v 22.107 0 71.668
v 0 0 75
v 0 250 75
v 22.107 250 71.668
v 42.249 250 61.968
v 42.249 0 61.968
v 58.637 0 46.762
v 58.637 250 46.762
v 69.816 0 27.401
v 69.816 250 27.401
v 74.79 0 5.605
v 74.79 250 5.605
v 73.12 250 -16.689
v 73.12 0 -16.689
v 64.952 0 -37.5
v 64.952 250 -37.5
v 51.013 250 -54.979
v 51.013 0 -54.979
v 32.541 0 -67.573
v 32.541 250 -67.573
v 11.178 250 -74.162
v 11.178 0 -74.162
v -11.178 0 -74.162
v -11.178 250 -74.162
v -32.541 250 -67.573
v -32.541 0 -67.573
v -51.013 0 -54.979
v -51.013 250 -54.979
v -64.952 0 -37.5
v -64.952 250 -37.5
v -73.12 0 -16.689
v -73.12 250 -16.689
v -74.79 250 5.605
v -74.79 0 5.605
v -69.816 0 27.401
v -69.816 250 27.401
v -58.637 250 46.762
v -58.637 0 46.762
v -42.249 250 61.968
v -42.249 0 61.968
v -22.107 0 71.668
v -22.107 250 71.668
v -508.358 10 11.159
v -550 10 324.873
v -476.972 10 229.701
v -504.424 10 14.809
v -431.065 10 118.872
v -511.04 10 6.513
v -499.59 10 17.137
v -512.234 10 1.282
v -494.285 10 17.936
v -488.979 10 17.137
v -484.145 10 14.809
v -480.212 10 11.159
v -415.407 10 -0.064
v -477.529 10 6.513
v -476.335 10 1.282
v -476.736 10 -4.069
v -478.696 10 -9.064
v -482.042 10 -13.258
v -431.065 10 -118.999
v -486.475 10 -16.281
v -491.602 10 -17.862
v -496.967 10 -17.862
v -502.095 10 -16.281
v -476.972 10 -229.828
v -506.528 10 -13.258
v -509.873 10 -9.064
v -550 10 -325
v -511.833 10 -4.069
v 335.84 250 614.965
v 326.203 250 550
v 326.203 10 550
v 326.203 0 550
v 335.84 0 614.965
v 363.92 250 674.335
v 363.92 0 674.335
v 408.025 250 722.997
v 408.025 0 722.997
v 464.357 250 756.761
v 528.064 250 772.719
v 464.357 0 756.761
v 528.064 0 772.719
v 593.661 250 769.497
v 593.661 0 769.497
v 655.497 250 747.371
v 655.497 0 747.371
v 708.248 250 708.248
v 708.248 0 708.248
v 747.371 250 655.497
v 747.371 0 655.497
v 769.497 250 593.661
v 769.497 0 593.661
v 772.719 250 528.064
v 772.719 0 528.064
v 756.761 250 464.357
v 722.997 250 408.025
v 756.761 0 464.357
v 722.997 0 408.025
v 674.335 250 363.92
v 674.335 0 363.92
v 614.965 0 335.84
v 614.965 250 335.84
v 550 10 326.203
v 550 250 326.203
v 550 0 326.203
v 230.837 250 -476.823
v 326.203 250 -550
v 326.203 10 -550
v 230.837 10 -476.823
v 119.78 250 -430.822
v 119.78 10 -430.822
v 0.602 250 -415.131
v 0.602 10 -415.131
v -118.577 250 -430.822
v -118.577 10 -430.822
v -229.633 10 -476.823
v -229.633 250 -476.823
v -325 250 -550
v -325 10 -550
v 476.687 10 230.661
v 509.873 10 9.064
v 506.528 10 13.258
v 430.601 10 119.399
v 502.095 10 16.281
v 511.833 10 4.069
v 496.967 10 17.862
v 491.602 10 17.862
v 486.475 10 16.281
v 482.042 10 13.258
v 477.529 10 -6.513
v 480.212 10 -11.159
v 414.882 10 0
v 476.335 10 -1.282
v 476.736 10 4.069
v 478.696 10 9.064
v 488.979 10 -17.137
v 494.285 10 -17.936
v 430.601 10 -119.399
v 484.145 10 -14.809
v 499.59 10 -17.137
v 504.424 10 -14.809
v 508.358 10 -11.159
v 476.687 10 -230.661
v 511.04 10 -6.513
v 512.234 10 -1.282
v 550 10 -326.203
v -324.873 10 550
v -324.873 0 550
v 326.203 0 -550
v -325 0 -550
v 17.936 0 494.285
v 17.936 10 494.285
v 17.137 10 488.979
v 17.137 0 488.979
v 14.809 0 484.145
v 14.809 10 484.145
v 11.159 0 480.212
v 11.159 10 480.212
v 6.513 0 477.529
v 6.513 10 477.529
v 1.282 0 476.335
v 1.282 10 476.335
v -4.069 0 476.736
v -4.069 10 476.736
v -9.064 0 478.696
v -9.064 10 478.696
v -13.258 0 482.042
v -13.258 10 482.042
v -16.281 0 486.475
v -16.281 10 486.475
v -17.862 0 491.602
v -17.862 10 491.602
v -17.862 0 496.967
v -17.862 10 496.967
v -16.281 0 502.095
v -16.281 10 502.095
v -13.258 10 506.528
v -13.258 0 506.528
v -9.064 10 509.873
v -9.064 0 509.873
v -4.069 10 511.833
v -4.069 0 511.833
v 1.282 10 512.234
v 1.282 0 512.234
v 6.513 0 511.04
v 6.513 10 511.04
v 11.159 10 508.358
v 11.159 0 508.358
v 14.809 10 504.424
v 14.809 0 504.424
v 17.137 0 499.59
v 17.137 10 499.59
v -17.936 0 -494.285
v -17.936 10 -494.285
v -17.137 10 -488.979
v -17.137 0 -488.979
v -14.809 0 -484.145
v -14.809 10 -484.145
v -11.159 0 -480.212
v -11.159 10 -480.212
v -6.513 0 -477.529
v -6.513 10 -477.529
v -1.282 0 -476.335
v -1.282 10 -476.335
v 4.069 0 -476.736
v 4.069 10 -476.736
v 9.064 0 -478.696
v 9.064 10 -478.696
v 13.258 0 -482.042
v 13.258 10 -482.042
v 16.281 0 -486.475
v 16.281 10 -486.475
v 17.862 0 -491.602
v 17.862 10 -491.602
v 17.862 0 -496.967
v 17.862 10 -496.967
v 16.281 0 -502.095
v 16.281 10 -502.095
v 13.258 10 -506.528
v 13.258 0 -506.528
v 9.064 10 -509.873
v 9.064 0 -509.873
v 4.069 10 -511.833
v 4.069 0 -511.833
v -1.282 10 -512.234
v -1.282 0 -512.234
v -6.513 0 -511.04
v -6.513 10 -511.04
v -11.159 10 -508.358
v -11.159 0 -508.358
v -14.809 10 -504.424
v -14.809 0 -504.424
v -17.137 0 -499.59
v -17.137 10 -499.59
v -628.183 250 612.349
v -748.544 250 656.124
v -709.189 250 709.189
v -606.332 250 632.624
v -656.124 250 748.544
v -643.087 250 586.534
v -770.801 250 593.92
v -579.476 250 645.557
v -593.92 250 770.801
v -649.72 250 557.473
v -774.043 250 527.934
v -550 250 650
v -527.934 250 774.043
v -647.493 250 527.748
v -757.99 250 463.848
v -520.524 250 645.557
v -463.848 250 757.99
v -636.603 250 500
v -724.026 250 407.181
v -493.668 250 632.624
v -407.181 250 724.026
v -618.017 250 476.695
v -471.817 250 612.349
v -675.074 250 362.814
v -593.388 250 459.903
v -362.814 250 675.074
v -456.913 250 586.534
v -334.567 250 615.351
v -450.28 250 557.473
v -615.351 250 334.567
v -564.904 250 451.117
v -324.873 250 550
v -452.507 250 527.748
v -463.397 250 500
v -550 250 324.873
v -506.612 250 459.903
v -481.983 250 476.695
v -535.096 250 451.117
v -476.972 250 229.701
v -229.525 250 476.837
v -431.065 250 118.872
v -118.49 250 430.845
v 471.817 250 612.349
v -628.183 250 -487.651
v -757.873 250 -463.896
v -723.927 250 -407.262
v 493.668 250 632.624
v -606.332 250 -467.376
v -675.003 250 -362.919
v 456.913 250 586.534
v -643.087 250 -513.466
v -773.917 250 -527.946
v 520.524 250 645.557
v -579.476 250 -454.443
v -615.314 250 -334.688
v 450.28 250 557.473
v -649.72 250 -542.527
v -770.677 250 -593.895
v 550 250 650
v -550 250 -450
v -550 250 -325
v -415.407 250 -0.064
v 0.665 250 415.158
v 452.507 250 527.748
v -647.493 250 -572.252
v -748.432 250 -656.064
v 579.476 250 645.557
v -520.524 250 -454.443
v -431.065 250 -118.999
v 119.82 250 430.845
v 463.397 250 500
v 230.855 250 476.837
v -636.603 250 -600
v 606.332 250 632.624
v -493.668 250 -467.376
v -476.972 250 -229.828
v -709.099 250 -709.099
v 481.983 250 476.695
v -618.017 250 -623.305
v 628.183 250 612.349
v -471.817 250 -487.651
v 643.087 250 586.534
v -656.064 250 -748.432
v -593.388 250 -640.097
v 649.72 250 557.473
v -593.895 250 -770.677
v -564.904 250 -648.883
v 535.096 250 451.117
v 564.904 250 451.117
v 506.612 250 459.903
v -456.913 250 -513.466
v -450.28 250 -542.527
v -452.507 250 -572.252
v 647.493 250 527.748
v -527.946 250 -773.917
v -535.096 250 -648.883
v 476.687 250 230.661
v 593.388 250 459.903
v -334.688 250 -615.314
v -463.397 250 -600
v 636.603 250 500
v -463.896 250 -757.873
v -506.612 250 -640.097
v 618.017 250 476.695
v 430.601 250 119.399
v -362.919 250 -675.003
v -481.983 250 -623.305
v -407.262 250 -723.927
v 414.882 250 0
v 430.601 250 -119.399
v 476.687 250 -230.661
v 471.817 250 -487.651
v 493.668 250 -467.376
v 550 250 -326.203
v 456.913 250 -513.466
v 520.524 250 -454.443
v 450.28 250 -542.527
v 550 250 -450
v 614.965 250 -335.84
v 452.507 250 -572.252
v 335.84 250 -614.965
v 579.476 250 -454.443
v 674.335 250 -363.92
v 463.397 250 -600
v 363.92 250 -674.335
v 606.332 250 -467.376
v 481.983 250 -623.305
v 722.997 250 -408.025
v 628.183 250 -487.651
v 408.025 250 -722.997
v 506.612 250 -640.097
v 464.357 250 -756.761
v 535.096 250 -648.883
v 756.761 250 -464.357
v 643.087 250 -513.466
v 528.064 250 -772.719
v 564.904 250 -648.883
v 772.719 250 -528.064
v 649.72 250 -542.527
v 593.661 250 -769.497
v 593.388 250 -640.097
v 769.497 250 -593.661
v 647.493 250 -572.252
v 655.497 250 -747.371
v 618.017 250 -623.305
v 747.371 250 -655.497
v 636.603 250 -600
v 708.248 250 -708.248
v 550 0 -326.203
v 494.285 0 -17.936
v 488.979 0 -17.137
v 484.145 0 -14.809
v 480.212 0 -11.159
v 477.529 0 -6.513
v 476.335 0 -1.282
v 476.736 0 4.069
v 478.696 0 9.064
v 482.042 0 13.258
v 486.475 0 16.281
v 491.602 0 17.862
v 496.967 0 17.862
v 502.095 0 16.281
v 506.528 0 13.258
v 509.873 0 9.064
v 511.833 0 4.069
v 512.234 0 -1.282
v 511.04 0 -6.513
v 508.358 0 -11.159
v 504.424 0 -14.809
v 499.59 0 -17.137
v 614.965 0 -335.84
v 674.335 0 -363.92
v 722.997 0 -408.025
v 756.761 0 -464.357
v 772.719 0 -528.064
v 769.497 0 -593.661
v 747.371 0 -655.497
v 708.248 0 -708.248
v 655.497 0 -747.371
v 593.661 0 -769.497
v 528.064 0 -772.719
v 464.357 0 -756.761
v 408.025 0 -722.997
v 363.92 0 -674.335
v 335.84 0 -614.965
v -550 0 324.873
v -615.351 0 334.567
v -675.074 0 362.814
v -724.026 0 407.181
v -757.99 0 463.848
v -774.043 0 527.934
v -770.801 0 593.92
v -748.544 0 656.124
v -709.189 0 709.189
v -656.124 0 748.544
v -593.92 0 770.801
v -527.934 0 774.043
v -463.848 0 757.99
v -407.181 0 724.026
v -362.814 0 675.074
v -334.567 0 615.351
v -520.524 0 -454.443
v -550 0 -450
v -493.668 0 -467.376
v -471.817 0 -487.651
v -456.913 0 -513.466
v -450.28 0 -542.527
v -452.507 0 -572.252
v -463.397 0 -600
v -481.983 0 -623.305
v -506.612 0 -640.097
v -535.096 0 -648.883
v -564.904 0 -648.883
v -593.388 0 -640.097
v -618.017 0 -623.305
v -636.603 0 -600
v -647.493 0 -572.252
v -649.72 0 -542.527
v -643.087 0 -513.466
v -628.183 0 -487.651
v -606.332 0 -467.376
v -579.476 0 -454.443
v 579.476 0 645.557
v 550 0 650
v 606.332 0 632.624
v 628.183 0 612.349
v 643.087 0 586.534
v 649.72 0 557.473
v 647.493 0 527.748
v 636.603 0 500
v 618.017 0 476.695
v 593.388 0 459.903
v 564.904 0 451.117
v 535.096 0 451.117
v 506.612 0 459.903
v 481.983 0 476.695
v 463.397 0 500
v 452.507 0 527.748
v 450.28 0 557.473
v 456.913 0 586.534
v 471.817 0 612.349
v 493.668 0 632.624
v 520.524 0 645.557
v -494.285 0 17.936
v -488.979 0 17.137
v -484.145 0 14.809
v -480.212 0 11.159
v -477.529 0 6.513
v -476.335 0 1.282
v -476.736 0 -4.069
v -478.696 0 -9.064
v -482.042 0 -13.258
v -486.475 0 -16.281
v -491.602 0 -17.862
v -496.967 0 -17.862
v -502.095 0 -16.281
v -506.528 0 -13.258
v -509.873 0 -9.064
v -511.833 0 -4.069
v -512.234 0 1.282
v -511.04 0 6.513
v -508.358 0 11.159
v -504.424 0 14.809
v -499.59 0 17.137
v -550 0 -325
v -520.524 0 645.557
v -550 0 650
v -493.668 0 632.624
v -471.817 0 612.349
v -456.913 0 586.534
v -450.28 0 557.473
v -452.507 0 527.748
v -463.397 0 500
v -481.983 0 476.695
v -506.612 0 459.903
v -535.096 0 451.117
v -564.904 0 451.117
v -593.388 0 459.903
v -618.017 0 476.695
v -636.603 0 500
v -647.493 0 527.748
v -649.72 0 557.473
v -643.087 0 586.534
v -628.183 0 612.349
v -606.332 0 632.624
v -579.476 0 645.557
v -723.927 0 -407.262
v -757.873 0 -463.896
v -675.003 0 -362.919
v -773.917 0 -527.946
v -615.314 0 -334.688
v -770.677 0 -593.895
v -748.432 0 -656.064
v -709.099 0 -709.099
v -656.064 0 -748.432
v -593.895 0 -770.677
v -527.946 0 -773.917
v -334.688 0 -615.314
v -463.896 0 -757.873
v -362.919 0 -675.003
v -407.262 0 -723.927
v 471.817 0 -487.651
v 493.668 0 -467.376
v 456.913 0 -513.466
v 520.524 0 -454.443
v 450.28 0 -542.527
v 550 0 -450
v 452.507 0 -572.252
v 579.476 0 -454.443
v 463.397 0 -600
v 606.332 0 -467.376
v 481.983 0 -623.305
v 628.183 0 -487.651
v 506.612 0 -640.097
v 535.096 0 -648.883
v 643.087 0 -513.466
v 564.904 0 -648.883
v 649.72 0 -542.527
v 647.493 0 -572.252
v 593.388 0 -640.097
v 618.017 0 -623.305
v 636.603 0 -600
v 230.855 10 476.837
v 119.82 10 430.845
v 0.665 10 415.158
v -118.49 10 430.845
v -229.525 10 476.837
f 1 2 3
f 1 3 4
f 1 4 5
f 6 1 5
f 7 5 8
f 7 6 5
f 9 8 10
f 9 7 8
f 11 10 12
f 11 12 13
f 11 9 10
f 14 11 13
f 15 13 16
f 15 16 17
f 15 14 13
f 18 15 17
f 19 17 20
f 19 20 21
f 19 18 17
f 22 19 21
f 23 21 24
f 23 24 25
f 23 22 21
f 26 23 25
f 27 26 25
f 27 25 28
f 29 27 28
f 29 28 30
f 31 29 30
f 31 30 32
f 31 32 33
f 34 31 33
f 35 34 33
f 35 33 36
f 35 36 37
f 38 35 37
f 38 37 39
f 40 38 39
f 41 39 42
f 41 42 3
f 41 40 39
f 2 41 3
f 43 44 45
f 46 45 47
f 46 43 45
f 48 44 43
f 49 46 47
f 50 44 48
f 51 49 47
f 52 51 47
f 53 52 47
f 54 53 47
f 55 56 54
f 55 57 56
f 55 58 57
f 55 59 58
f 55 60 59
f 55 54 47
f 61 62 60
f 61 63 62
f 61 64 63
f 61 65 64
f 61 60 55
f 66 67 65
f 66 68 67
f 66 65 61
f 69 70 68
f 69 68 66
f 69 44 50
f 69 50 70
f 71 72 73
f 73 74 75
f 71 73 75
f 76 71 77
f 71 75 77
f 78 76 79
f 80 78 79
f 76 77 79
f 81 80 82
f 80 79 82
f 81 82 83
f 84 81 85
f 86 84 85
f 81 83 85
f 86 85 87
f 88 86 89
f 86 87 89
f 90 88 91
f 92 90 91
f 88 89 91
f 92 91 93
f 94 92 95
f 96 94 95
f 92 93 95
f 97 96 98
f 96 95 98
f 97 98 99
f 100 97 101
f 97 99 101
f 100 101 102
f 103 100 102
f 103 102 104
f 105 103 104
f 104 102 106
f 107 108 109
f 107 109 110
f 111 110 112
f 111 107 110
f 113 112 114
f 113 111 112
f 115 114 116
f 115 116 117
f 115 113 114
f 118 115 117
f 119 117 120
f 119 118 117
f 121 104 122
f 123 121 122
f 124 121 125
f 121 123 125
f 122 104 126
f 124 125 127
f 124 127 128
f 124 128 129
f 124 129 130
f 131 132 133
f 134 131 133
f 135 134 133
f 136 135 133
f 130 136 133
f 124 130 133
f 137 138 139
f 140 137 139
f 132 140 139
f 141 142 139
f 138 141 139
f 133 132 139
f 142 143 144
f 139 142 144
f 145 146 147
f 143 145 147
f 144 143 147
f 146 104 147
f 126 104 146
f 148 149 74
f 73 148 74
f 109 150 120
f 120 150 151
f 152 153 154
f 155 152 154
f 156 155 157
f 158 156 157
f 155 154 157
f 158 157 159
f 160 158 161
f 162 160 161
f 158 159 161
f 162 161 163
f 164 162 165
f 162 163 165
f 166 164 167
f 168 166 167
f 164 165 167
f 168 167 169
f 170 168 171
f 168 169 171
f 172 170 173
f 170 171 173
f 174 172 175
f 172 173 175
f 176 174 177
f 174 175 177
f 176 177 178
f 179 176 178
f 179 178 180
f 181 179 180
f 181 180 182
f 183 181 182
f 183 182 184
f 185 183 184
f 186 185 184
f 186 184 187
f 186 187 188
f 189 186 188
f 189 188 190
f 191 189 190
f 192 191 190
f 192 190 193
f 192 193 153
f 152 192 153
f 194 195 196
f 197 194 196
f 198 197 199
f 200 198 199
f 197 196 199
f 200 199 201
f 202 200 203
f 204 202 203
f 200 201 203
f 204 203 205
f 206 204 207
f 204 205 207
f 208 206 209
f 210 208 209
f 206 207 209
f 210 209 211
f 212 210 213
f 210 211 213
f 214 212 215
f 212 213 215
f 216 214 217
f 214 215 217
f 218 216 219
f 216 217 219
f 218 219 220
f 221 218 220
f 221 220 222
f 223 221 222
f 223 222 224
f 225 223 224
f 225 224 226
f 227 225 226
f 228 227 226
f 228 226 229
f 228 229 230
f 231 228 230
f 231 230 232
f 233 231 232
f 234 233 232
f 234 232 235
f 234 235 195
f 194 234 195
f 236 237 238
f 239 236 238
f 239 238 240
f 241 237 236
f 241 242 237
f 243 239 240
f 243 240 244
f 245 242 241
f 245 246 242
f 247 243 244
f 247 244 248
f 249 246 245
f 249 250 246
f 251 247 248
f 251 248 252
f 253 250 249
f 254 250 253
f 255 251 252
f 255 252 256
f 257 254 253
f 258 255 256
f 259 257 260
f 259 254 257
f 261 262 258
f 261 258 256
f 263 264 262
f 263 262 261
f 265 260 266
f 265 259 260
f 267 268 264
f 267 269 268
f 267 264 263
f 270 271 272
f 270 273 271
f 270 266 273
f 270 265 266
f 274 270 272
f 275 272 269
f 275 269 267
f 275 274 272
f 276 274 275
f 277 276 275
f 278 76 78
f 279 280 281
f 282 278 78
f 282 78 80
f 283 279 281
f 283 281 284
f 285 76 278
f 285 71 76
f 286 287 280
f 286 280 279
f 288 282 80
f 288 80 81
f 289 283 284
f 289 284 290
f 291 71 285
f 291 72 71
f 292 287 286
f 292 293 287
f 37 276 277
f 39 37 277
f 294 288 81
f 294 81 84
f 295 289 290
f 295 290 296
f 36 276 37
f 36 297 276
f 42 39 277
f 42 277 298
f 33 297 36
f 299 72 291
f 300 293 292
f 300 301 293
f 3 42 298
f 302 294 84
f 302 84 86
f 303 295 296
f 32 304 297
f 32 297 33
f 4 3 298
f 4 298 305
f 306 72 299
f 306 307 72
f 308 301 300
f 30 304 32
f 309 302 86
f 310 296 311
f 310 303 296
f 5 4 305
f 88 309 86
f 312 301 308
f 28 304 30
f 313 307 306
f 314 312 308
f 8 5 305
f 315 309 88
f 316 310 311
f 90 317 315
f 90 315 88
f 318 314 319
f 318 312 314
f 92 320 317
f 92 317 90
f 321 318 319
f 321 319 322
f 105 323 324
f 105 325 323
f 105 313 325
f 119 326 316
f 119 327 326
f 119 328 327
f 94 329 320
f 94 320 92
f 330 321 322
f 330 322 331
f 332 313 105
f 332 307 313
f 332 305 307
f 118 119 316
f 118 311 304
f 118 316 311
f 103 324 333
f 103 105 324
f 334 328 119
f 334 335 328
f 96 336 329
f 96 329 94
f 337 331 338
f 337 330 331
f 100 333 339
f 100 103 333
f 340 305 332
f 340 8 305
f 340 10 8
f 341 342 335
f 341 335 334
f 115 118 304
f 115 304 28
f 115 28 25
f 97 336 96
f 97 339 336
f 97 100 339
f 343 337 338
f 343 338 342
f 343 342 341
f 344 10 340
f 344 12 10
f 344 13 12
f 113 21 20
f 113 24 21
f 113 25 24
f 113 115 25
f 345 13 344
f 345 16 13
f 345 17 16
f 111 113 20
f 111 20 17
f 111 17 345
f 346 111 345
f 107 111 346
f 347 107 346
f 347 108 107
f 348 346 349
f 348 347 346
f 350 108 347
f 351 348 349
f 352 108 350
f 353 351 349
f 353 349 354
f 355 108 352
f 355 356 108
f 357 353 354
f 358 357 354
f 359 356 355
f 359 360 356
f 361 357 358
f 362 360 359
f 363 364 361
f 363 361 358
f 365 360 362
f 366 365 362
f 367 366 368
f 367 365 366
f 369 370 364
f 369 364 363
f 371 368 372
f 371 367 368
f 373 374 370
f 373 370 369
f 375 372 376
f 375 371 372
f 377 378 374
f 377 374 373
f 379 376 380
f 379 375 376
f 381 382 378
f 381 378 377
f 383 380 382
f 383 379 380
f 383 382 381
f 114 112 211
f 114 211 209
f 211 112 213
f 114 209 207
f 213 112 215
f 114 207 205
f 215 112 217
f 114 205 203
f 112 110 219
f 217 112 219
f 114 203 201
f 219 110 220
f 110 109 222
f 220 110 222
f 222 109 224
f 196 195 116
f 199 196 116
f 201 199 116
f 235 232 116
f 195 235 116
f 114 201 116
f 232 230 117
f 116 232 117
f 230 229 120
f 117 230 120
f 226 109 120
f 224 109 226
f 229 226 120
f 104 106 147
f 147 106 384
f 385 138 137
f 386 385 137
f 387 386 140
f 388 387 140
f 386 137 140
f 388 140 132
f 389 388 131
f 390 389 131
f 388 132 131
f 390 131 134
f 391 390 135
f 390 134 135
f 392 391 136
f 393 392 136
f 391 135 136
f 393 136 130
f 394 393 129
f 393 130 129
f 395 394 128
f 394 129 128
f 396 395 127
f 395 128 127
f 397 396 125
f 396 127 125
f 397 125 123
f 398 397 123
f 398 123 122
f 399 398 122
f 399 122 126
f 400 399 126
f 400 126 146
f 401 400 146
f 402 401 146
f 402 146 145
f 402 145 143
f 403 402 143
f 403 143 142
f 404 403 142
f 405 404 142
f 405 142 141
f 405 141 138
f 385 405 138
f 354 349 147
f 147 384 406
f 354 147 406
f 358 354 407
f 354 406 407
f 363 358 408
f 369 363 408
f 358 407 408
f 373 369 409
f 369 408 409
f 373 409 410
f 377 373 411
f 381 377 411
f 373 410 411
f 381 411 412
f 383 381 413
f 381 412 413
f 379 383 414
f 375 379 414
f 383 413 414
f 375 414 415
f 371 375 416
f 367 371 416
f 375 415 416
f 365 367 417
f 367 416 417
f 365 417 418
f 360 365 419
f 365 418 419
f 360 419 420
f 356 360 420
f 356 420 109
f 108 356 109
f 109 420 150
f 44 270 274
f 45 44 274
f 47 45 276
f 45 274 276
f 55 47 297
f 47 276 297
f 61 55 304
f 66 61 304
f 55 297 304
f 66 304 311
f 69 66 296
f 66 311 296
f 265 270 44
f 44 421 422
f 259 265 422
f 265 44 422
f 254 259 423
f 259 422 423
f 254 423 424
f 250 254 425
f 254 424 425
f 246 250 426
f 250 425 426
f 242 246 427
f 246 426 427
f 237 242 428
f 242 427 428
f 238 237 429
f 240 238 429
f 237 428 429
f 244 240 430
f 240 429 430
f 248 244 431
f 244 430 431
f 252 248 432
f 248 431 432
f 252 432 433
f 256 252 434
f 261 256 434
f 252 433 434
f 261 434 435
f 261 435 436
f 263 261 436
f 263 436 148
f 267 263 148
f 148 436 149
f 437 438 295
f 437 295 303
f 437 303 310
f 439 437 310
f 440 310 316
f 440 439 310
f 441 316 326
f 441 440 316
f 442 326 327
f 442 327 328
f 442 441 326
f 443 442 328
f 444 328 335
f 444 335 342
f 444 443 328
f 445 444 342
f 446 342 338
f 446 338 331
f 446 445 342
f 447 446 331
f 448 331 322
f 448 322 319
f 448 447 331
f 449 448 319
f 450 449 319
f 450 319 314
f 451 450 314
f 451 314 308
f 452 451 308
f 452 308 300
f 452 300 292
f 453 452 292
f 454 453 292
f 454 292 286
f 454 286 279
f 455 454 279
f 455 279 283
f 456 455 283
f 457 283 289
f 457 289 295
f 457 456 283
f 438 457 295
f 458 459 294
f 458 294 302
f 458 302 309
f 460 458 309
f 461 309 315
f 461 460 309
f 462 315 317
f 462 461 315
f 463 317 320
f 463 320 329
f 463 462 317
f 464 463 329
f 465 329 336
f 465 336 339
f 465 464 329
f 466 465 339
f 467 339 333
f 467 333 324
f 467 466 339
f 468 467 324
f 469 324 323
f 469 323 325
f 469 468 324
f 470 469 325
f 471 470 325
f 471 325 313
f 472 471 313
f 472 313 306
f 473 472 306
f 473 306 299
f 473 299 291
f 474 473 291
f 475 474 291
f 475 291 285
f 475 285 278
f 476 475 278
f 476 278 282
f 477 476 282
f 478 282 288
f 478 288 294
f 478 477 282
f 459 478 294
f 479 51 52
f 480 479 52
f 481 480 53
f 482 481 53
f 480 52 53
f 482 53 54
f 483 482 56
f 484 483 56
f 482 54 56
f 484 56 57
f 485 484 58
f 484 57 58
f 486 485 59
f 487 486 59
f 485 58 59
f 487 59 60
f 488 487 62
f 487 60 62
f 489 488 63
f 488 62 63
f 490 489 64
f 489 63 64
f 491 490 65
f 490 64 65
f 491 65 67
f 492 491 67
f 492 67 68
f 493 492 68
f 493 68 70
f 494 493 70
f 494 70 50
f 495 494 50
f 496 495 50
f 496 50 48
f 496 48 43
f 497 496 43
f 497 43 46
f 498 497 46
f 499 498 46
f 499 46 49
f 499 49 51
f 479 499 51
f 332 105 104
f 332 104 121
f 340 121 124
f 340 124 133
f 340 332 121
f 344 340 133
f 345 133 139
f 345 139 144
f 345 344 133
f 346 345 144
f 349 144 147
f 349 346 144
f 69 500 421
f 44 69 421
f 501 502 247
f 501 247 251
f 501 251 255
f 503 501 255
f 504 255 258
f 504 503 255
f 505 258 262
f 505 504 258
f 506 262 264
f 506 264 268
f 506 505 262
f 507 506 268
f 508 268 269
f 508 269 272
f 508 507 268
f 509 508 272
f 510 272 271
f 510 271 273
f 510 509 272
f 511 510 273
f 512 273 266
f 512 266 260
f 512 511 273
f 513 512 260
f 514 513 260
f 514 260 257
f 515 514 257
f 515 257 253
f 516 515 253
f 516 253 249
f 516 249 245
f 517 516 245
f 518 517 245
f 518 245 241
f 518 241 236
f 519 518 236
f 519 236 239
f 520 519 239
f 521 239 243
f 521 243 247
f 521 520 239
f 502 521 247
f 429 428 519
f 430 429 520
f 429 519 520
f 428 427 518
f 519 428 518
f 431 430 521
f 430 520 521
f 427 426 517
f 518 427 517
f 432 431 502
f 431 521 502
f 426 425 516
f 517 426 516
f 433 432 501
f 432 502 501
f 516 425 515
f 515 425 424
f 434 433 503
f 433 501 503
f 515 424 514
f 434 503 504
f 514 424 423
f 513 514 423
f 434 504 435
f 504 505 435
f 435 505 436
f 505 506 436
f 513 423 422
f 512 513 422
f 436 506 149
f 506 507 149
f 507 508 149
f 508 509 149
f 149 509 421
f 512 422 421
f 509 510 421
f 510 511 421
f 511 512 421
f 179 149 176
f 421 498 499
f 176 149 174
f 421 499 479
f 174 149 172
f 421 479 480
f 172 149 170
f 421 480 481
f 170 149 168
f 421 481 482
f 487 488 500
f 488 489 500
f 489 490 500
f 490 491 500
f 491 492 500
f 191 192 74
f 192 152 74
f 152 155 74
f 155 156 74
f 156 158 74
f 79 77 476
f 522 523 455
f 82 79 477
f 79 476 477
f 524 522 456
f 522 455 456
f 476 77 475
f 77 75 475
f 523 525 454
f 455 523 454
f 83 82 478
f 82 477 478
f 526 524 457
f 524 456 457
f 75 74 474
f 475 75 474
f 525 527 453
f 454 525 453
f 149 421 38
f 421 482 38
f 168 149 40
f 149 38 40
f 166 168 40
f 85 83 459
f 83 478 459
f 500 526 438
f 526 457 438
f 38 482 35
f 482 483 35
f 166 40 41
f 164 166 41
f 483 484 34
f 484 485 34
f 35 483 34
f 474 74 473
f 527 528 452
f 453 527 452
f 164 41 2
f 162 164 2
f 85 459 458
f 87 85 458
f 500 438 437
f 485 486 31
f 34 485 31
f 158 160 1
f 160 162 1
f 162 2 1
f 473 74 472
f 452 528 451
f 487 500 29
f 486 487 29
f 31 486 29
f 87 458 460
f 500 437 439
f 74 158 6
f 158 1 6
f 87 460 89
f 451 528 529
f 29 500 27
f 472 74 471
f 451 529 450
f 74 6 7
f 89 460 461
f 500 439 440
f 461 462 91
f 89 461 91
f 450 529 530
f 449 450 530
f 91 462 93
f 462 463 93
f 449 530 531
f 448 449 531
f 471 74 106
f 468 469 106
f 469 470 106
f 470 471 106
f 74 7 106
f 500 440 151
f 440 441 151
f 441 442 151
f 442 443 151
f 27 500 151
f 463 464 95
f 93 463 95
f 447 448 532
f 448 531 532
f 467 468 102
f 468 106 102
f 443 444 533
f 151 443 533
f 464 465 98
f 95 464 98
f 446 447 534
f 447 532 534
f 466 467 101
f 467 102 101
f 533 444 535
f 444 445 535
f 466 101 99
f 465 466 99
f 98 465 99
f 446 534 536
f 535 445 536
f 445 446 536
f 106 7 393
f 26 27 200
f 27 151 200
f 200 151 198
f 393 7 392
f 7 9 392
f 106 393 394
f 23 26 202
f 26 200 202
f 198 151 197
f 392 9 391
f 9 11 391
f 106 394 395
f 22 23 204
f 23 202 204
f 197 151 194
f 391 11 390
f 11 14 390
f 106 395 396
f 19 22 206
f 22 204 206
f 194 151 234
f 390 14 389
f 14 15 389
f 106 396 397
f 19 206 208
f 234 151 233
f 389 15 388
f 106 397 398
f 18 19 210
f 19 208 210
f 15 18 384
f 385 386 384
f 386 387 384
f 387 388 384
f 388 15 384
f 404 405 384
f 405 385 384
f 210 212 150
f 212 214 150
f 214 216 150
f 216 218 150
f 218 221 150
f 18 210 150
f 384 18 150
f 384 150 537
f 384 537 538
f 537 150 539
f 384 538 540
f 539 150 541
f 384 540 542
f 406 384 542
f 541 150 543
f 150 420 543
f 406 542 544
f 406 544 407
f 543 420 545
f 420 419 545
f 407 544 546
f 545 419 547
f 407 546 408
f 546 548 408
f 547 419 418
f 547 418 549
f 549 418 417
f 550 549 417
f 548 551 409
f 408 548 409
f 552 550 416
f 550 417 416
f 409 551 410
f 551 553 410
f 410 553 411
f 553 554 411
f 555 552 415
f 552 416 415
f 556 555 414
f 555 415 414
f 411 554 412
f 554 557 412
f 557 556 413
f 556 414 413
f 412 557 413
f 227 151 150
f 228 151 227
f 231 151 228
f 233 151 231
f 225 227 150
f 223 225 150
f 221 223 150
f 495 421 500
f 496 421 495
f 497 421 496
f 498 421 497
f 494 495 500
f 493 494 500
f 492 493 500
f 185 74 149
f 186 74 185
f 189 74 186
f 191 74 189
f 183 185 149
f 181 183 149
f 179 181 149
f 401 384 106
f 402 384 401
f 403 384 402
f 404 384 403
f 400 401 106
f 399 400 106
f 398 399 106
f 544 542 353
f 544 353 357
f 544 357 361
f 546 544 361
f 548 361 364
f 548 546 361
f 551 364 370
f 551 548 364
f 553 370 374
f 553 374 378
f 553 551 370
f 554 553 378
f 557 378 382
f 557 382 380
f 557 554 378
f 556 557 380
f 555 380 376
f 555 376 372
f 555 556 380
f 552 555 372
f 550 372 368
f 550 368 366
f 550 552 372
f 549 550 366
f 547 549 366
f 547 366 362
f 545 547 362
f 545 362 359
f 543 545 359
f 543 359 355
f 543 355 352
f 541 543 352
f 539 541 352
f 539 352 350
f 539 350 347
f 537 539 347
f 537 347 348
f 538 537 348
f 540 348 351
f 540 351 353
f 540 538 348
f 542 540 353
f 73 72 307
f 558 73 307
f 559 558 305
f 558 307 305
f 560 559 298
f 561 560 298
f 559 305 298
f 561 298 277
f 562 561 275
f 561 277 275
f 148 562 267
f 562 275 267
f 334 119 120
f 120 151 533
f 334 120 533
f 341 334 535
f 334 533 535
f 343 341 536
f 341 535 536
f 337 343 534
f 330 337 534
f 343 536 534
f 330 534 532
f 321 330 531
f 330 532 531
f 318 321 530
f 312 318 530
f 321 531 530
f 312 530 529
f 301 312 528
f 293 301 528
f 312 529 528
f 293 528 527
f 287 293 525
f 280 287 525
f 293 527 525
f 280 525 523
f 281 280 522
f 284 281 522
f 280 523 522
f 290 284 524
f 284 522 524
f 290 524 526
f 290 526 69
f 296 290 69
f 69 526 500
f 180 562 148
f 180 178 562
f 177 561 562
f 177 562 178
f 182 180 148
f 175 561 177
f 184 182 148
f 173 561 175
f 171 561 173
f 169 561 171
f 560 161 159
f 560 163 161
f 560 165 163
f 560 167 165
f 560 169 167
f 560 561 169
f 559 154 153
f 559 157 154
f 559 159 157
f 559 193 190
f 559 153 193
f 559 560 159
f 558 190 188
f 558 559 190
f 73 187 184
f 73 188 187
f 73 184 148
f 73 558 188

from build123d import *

# Parameters (mm, degrees)
IZIM1_R                     = 75
IZIM1_R_2                   = 100
Y_KSEKLIK_EKSTR_ZYON3_DEPTH = 250
KES_EKSTR_ZYON2_DEPTH       = 240
IZIM4_R                     = 18
KES_EKSTR_ZYON3_DEPTH       = 240
DAIRESEL_KAPLAMA1_COUNT     = 4


with BuildPart() as part:
    # Çizim1 → Yükseklik-Ekstrüzyon3 (new body)
    with BuildSketch(Plane(origin=(0, 0, 0), x_dir=(1, 0, 0), z_dir=(0, 1, 0))):
        with BuildLine():
            Line((326.203305187, 550), (-325, 550))
            ThreePointArc((-325, 550), (-709.099025767, 709.099025767), (-550, 325))
            Line((-550, 325), (-550, -324.872993427))
            ThreePointArc((-550, -324.872993427), (-709.188832976, -709.188832976), (-324.872993427, -550))
            Line((-324.872993427, -550), (326.203305187, -550))
            ThreePointArc((326.203305187, -550), (708.248160509, -708.248160509), (550, -326.203305187))
            Line((550, -326.203305187), (550, 326.203305187))
            ThreePointArc((550, 326.203305187), (708.248160509, 708.248160509), (326.203305187, 550))
        make_face()
        with Locations(Location((0, 0, 0), (0, 0, 270))):
            Circle(IZIM1_R, mode=Mode.SUBTRACT)
        with Locations(Location((-550, 550, 0), (0, 0, 270))):
            Circle(IZIM1_R_2, mode=Mode.SUBTRACT)
        with Locations(Location((-550, -550, 0), (0, 0, 270))):
            Circle(IZIM1_R_2, mode=Mode.SUBTRACT)
        with Locations(Location((550, 550, 0), (0, 0, 270))):
            Circle(IZIM1_R_2, mode=Mode.SUBTRACT)
        with Locations(Location((550, -550, 0), (0, 0, 270))):
            Circle(IZIM1_R_2, mode=Mode.SUBTRACT)
    extrude(amount=Y_KSEKLIK_EKSTR_ZYON3_DEPTH)

    # Çizim2 → Kes-Ekstrüzyon2 (cut)
    with BuildSketch(Plane(origin=(0, 250, 0), x_dir=(1, 0, 0), z_dir=(0, 1, 0))):
        with BuildLine():
            Line((-550, 325), (-550, -324.872993427))
            ThreePointArc((-550, -324.872993427), (-415.406896151, 0.063503286), (-550, 325))
        make_face()
        with BuildLine():
            Line((-324.872993427, -550), (326.203305187, -550))
            ThreePointArc((326.203305187, -550), (0.66515588, -415.157683487), (-324.872993427, -550))
        make_face()
        with BuildLine():
            Line((-325, 550), (326.203305187, 550))
            ThreePointArc((326.203305187, 550), (0.601652594, 415.131379565), (-325, 550))
        make_face()
        with BuildLine():
            Line((550, 326.203305187), (550, -326.203305187))
            ThreePointArc((550, -326.203305187), (414.882166901, 0), (550, 326.203305187))
        make_face()
    extrude(amount=-KES_EKSTR_ZYON2_DEPTH, mode=Mode.SUBTRACT)

    # Çizim4 → Kes-Ekstrüzyon3 (cut)
    with BuildSketch(Plane(origin=(0, 10, 0), x_dir=(1, 0, 0), z_dir=(0, 1, 0))):
        with Locations(Location((-494.284737224, 0.063503286, 0), (0, 0, 270))):
            Circle(IZIM4_R)
    kes_ekstr_zyon3 = extrude(amount=-KES_EKSTR_ZYON3_DEPTH, mode=Mode.SUBTRACT)

    # Dairesel Kaplama1: Kes-Ekstrüzyon3 ×4 about axis
    dairesel_kaplama1_axis = Axis((0, 0, 0), (0, 1, 0))
    for i in range(1, DAIRESEL_KAPLAMA1_COUNT):
        add(kes_ekstr_zyon3.rotate(dairesel_kaplama1_axis, i * 360 / DAIRESEL_KAPLAMA1_COUNT), mode=Mode.SUBTRACT)


solid = part.part
